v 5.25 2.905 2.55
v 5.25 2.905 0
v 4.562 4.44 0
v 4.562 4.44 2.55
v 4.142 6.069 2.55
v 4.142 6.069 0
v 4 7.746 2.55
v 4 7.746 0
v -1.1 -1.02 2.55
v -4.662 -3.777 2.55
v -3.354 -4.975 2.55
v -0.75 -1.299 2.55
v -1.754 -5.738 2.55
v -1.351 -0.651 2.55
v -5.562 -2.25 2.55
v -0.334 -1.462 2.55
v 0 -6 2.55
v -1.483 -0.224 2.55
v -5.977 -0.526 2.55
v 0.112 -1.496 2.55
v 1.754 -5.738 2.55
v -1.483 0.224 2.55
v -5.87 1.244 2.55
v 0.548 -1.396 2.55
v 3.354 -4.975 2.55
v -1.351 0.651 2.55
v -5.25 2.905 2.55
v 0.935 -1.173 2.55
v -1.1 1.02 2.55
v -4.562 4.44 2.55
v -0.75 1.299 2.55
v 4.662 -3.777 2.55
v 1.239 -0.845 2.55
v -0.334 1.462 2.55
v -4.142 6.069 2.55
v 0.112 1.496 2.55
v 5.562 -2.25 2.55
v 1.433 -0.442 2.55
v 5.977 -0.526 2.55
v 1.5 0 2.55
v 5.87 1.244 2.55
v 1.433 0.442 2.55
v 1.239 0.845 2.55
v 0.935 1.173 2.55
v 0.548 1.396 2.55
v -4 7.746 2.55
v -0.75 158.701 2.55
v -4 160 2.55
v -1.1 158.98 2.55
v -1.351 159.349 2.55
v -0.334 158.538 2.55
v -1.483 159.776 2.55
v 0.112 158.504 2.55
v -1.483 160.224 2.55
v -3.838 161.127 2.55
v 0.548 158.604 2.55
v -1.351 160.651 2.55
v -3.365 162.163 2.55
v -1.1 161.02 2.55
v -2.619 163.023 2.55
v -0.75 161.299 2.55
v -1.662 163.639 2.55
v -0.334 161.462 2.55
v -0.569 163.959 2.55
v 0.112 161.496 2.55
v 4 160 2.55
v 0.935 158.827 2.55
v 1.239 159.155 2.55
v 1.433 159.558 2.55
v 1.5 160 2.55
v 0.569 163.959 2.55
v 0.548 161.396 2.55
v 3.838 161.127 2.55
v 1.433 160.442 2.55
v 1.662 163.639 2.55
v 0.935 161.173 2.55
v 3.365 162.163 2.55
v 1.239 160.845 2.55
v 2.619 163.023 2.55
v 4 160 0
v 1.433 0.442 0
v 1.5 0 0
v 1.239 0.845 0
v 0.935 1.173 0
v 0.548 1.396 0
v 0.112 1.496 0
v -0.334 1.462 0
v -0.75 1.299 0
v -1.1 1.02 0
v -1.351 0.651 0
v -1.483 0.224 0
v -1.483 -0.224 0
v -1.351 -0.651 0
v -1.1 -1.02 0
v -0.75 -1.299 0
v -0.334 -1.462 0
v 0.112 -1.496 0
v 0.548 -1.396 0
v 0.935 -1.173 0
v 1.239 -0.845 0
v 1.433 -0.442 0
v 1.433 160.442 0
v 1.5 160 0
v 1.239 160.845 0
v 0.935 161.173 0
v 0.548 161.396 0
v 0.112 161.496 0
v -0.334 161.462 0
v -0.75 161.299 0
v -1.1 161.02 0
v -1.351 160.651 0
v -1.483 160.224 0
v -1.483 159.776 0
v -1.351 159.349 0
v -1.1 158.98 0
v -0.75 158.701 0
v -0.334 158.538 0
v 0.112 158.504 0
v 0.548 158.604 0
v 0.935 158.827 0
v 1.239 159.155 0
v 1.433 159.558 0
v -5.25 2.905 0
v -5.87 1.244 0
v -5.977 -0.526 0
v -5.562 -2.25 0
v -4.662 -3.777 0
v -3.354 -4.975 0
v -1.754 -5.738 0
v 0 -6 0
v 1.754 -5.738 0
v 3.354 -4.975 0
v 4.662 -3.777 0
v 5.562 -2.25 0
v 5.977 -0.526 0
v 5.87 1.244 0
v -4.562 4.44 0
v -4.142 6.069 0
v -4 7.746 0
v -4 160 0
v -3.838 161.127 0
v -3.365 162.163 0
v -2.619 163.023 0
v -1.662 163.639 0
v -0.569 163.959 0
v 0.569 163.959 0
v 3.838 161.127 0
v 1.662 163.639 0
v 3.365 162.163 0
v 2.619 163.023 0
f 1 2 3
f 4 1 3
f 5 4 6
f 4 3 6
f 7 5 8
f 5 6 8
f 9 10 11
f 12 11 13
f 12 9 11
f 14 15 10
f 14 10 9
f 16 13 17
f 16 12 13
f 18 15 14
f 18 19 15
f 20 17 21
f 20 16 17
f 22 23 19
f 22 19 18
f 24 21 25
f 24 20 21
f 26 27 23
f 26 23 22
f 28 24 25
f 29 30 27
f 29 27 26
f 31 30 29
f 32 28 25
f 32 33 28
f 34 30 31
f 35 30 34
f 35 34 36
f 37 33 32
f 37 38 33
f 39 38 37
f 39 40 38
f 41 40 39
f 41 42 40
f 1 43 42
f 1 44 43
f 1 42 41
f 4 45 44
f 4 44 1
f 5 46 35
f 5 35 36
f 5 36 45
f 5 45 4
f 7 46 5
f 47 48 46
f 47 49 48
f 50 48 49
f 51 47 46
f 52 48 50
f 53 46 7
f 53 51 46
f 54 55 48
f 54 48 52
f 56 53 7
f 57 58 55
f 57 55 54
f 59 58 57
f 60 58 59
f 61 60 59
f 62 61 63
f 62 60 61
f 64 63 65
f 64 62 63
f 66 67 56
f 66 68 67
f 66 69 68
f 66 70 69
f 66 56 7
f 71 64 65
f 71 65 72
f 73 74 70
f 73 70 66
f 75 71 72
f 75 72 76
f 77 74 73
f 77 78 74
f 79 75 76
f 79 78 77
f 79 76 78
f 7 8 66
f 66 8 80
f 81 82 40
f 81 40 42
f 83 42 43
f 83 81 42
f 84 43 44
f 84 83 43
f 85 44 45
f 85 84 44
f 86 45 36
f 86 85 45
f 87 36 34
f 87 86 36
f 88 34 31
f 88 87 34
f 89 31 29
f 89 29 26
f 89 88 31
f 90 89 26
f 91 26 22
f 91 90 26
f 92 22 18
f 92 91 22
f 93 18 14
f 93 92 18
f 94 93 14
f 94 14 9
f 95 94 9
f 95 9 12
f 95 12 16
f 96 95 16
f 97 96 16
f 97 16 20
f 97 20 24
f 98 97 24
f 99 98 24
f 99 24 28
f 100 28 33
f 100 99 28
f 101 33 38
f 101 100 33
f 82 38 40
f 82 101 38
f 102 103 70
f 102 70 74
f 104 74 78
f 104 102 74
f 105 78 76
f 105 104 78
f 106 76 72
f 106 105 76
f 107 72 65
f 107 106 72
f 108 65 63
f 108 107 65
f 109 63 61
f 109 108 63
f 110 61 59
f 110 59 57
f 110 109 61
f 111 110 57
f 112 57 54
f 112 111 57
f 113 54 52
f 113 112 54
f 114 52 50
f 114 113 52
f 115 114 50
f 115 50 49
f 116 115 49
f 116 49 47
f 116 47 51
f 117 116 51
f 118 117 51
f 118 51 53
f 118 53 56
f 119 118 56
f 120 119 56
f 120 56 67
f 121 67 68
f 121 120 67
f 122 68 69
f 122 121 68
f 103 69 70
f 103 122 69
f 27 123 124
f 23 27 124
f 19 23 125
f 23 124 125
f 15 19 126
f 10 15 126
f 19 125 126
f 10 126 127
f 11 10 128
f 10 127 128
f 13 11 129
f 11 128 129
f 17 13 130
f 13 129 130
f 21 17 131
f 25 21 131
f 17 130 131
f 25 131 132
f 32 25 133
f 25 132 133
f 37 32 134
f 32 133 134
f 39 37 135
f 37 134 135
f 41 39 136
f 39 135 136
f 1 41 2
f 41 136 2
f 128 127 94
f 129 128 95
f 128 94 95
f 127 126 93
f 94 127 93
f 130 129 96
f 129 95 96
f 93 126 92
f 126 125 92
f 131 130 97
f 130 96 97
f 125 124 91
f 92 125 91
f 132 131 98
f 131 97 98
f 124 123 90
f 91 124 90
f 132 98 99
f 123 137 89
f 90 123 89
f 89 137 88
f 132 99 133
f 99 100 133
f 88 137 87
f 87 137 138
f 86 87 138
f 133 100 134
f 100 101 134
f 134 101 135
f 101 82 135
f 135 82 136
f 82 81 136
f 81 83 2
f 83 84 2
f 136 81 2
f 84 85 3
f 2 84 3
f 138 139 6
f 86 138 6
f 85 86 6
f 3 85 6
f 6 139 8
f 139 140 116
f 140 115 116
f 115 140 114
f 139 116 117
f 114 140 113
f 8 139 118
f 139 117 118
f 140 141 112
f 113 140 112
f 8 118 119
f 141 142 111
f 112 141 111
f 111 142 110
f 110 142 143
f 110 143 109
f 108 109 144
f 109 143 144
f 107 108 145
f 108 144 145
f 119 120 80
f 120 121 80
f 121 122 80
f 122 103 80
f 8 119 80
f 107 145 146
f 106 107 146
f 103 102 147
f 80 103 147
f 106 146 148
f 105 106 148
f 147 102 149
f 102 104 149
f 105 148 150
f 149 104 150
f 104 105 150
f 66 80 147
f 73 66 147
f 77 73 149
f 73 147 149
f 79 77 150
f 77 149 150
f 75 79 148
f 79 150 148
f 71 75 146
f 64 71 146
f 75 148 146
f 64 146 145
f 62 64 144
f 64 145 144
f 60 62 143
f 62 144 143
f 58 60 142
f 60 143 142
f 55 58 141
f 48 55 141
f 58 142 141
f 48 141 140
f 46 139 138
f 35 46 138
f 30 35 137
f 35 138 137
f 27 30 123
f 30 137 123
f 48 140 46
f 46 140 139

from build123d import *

# Parameters (mm, degrees)
MODEL_R             = 1.5
BOSS_EXTRUDE1_DEPTH = 2.55


with BuildPart() as part:
    # Model → Boss-Extrude1 (new body)
    with BuildSketch(Plane.XY):
        with BuildLine():
            Line((-4, 8.512011392), (-4, 7.745966692))
            ThreePointArc((-4, 7.745966692), (-4.317541634, 5.245966692), (-5.25, 2.90473751))
            ThreePointArc((-5.25, 2.90473751), (0, -6), (5.25, 2.90473751))
            ThreePointArc((5.25, 2.90473751), (4.317541634, 5.245966692), (4, 7.745966692))
            Line((4, 7.745966692), (4, 8.785724032))
            Line((4, 8.785724032), (4, 160))
            ThreePointArc((4, 160), (0, 164), (-4, 160))
            Line((-4, 160), (-4, 8.512011392))
        make_face()
        Circle(MODEL_R, mode=Mode.SUBTRACT)
        with Locations((0, 160)):
            Circle(MODEL_R, mode=Mode.SUBTRACT)
    extrude(amount=BOSS_EXTRUDE1_DEPTH)


solid = part.part
